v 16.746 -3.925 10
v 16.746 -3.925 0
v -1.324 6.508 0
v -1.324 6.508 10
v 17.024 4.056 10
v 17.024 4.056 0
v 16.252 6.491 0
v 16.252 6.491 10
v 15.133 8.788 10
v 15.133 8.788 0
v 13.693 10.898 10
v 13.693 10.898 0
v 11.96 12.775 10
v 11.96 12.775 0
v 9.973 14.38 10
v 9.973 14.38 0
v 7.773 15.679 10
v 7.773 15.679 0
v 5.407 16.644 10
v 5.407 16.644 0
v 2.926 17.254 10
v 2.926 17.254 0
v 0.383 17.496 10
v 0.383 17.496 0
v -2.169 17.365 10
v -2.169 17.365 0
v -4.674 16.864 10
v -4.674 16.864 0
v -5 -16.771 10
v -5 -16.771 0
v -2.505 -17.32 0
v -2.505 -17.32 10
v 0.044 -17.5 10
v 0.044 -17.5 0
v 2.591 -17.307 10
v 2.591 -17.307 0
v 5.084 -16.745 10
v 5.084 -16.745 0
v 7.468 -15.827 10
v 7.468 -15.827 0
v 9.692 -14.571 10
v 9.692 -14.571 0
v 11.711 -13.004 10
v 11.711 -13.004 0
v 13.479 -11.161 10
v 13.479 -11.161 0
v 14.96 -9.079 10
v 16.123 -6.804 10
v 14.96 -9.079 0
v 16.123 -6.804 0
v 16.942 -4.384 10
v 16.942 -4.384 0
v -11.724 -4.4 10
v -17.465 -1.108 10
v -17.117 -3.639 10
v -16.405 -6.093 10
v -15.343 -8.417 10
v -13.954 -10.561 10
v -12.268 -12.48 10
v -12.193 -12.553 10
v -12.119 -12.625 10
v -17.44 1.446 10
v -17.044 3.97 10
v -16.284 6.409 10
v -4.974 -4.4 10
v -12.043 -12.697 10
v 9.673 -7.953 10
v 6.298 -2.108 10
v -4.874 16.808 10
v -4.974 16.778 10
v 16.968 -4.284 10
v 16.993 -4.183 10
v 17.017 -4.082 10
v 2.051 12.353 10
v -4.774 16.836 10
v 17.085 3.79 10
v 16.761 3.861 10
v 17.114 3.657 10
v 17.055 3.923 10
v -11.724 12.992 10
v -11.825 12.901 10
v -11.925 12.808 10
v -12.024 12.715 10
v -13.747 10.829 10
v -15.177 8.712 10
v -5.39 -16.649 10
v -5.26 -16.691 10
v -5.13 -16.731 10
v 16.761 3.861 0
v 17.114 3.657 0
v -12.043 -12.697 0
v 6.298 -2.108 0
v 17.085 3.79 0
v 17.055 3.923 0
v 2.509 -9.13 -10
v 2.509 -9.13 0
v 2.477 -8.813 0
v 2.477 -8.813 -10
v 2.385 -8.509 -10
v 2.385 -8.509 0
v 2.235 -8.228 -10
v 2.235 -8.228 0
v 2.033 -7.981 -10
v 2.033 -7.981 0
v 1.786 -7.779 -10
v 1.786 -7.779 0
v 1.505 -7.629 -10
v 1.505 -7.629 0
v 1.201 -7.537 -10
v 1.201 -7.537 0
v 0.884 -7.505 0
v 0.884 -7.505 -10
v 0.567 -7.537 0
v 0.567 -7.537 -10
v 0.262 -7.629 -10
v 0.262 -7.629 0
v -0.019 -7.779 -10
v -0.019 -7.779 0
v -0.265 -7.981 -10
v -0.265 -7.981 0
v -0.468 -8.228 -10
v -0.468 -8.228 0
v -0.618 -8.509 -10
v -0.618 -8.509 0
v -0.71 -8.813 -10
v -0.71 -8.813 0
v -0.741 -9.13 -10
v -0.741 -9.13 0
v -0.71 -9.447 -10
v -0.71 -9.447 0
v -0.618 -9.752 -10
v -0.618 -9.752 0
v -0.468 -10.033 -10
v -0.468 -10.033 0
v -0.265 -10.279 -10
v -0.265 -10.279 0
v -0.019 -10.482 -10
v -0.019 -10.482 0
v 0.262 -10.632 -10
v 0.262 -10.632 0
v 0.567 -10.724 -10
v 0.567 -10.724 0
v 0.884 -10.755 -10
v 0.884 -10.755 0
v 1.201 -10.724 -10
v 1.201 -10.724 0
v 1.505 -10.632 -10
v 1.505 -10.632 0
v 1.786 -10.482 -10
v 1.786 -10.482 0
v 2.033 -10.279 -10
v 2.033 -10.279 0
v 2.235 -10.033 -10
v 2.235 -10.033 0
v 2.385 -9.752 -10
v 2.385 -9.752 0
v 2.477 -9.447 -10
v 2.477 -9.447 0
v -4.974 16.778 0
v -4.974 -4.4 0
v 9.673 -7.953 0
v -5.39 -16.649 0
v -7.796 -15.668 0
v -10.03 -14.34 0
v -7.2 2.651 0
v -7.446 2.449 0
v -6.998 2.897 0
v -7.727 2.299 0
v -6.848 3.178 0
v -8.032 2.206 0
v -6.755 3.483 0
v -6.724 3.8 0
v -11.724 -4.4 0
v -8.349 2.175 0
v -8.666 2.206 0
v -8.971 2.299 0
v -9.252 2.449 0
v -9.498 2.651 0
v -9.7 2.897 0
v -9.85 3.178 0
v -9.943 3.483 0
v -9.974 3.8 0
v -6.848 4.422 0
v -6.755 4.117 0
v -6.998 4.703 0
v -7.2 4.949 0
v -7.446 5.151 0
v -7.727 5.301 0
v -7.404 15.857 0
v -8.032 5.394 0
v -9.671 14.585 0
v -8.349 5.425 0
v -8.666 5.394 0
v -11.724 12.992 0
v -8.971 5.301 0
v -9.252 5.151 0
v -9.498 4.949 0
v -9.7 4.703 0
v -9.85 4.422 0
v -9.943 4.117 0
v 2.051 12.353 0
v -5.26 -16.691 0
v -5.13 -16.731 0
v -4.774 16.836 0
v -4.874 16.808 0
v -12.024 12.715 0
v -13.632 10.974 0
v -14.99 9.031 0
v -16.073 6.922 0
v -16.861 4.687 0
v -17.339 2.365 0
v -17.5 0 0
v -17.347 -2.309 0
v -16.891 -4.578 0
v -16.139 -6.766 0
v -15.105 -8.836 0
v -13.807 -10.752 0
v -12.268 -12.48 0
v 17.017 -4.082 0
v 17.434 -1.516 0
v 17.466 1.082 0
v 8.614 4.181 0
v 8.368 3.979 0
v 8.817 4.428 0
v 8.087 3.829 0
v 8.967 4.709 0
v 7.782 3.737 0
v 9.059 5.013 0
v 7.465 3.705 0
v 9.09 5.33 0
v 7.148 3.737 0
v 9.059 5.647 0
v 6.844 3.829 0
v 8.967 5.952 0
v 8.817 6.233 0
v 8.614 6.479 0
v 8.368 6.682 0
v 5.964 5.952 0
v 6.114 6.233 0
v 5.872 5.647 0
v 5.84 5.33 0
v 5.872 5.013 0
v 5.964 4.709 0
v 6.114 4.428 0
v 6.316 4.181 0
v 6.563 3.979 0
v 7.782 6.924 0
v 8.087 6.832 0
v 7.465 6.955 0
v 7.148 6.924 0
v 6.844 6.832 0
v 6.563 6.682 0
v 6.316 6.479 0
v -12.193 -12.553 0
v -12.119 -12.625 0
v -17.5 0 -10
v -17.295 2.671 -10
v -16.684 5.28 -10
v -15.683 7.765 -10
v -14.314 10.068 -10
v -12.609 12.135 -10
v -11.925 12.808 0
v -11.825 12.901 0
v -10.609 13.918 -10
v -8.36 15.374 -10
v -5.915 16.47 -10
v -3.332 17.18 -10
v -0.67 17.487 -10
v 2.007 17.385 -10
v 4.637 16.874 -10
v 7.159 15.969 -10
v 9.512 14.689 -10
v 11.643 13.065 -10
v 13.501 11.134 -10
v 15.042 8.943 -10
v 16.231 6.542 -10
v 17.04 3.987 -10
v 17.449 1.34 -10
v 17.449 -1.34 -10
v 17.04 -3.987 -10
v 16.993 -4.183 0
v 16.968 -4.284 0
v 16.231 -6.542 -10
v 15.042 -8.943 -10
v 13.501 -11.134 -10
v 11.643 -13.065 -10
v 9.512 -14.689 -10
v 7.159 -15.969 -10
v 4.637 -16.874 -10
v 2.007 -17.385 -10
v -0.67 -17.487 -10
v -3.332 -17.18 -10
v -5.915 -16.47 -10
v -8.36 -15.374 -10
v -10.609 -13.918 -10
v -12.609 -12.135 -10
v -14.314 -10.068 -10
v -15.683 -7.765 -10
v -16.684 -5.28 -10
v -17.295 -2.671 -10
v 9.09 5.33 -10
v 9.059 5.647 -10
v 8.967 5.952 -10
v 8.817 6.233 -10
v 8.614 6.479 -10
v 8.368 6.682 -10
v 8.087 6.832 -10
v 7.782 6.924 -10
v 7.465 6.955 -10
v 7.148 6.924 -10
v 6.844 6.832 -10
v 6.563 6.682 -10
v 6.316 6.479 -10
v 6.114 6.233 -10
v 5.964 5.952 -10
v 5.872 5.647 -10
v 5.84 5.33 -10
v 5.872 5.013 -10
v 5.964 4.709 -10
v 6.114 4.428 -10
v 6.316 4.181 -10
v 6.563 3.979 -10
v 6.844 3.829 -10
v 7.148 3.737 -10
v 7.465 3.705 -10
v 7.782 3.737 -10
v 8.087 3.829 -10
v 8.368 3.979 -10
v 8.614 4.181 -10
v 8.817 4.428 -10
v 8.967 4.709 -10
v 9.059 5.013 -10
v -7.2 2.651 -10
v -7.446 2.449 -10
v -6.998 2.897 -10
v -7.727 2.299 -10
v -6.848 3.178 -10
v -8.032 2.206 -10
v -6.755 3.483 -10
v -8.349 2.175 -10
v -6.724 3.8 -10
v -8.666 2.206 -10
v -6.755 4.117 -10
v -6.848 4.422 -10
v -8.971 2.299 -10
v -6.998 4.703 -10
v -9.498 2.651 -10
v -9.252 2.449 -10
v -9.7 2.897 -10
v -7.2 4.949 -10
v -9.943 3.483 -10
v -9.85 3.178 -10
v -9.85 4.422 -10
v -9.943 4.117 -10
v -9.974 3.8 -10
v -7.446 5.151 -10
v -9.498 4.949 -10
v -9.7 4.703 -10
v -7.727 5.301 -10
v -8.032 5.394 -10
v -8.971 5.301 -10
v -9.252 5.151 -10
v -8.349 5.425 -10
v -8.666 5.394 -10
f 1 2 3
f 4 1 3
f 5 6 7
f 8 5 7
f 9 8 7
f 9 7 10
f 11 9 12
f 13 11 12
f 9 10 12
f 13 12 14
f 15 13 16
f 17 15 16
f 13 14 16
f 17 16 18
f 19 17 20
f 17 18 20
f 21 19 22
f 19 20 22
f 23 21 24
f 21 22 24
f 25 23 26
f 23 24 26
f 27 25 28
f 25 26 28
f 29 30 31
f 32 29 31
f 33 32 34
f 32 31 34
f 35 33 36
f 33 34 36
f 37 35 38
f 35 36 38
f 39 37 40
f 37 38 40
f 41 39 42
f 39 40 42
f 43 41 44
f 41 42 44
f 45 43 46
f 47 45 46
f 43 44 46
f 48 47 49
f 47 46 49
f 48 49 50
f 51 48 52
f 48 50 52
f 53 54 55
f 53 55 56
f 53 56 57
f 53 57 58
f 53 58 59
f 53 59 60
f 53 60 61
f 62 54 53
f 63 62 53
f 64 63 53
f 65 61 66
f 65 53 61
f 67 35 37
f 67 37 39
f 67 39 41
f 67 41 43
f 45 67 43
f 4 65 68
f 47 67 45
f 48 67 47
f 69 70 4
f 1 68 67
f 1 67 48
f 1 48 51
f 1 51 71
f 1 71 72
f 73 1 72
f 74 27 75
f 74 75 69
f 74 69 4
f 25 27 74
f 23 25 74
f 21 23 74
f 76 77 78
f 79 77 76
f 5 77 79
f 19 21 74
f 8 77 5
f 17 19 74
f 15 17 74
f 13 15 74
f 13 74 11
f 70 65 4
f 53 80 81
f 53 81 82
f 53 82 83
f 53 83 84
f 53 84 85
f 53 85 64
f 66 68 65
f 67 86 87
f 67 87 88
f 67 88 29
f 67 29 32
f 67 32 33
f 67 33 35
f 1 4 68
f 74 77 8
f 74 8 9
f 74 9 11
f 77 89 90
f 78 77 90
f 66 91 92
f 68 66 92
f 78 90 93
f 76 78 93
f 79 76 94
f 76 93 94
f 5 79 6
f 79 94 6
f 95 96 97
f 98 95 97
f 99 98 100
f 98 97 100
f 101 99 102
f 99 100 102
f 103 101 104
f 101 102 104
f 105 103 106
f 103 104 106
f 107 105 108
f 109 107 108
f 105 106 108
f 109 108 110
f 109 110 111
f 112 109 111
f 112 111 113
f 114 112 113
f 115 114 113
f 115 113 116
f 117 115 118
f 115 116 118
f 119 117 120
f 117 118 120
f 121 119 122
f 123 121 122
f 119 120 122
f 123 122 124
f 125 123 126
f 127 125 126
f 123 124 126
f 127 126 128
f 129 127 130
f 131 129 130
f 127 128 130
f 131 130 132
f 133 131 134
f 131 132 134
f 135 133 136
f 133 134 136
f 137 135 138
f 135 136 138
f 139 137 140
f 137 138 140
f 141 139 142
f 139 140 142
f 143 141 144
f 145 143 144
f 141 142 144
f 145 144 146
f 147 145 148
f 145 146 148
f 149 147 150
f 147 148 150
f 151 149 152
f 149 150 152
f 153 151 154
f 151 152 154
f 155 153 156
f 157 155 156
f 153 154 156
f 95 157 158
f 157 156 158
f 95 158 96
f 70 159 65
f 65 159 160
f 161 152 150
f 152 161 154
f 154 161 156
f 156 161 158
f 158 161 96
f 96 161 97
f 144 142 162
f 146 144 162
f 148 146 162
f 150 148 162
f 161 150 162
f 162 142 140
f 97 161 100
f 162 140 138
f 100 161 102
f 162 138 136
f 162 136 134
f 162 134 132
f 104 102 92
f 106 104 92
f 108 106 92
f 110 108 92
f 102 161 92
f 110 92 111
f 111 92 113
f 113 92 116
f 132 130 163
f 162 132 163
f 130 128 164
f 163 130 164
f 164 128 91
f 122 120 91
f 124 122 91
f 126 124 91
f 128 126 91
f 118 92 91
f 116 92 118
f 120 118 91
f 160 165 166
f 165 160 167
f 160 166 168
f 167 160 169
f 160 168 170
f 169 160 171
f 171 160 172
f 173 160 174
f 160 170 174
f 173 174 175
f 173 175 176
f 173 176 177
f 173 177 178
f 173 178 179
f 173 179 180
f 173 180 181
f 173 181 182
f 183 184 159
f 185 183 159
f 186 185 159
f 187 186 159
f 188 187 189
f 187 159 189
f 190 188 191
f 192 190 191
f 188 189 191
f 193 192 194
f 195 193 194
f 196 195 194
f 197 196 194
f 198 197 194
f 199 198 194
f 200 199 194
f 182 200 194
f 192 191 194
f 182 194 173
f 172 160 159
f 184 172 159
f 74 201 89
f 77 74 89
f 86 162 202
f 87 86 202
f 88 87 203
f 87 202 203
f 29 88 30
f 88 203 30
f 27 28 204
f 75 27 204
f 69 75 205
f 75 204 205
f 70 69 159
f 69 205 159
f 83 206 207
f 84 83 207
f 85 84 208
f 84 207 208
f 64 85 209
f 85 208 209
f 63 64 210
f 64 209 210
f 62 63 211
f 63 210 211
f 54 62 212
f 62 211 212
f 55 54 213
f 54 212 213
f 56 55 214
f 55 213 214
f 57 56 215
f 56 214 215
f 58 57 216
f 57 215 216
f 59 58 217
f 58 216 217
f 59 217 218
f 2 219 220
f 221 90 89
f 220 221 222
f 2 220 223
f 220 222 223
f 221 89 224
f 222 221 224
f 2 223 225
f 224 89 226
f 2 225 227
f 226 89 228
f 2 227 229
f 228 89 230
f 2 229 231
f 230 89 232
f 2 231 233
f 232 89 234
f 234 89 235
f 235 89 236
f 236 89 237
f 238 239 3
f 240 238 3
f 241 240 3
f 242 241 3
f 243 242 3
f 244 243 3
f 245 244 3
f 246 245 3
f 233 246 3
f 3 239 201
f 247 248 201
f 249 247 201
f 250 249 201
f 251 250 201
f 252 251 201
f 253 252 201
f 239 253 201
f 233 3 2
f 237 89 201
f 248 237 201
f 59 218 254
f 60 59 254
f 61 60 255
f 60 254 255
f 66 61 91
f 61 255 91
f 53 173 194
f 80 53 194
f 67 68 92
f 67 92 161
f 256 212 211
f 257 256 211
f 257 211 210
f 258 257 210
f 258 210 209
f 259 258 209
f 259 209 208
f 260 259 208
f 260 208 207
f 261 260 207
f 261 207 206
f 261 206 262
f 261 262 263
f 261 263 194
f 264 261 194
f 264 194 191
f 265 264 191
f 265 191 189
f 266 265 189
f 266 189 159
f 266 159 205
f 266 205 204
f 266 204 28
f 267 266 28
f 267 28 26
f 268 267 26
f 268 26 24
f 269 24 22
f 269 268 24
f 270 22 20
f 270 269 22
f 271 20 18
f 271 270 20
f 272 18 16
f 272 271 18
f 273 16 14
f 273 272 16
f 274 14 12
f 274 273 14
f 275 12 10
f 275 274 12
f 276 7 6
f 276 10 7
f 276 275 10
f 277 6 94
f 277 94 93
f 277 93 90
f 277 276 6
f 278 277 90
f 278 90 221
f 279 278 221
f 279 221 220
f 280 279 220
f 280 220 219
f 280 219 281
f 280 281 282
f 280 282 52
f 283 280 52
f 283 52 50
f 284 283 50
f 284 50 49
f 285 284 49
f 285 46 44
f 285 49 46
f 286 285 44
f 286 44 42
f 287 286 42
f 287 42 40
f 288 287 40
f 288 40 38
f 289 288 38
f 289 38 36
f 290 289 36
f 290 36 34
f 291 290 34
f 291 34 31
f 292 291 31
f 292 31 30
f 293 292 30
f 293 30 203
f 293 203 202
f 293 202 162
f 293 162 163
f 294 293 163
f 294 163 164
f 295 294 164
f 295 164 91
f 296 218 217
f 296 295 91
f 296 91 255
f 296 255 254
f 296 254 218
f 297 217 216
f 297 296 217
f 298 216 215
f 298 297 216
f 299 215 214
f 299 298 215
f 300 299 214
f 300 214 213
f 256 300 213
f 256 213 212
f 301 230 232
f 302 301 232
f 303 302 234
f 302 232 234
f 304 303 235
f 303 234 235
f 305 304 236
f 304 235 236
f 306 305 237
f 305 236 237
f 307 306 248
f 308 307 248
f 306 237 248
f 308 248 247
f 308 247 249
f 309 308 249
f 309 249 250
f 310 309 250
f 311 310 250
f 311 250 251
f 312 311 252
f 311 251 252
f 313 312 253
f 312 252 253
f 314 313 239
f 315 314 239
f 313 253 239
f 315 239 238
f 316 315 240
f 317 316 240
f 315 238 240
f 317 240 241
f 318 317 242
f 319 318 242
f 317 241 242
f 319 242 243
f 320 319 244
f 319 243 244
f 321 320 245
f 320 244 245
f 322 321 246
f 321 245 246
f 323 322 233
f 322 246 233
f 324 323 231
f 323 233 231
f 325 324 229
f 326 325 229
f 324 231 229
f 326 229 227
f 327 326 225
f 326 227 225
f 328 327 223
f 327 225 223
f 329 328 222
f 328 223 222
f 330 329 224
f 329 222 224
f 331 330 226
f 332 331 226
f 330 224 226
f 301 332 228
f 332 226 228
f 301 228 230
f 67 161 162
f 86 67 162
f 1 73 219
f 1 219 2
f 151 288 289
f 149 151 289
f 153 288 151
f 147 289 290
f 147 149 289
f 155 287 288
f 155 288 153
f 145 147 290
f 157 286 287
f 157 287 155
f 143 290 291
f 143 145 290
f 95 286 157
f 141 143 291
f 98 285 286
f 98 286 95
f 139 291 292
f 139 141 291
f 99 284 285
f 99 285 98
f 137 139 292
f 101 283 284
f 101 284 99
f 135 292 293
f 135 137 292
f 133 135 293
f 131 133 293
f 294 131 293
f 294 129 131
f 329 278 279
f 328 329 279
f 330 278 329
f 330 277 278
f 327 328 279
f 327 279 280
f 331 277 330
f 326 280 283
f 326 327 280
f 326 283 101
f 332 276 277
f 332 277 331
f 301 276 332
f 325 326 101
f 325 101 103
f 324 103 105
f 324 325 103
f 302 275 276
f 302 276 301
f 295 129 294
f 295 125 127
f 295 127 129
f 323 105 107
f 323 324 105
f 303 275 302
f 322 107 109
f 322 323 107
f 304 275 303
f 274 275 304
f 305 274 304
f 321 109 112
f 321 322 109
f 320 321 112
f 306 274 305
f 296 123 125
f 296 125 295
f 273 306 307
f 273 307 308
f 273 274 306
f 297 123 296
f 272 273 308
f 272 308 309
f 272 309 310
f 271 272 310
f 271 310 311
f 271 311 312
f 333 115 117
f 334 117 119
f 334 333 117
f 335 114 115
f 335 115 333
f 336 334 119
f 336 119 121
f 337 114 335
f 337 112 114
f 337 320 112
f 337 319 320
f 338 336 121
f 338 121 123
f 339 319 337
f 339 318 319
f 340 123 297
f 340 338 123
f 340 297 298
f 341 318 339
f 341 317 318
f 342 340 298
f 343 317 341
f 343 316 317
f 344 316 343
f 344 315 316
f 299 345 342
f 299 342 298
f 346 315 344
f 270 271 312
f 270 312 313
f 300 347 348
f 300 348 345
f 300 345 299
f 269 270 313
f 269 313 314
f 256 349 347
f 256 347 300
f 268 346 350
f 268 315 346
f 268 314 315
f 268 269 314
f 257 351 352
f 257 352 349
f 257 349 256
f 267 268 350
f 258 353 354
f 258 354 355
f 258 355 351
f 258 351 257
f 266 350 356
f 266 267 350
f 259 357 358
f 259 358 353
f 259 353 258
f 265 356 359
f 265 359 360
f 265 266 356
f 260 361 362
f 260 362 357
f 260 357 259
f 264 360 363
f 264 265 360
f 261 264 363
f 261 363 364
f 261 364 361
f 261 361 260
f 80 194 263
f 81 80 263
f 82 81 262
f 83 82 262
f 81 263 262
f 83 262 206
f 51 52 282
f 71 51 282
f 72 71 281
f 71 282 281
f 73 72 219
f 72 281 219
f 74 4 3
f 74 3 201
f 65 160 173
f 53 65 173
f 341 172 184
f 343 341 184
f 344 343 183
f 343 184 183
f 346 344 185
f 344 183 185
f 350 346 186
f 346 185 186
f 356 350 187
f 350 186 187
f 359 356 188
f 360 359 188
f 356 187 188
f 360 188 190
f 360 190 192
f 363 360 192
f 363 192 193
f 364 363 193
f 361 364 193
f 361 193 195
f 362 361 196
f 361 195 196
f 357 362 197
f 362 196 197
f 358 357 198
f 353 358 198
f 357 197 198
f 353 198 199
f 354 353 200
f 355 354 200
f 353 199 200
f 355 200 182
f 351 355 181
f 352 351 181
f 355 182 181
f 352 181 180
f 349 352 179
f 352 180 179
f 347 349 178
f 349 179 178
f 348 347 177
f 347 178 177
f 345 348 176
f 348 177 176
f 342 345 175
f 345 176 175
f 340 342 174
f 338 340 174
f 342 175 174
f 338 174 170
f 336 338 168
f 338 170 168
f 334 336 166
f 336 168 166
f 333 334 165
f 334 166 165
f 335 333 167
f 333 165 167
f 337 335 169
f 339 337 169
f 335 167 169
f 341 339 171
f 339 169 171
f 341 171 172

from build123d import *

# Parameters (mm, degrees)
SALIENTE_EXTRUIR1_DEPTH = 10
SALIENTE_EXTRUIR2_START = 10
CROQUIS3_R              = 17.5
SALIENTE_EXTRUIR2_DEPTH = 10
CROQUIS1_3_R            = 1.625
CORTAR_EXTRUIR4_DEPTH   = 10
SALIENTE_EXTRUIR3_START = -10
SALIENTE_EXTRUIR3_DEPTH = 10


with BuildPart() as part:
    # Croquis1 → Saliente-Extruir1 (new body)
    with BuildSketch(Plane.XY):
        with BuildLine():
            Line((6.407309398, -1.697785417), (10.082309398, -8.063072135))
            Line((10.082309398, -8.063072135), (-4.999614275, -16.770624827))
            ThreePointArc((-4.999614275, -16.770624827), (8.602870321, -15.239442977), (16.941884153, -4.384354154))
            Line((16.941884153, -4.384354154), (-1.733329398, 6.397785417))
            Line((-1.733329398, 6.397785417), (1.941670602, 12.763072135))
            Line((1.941670602, 12.763072135), (17.023594275, 4.055519442))
            ThreePointArc((17.023594275, 4.055519442), (8.896309597, 15.070025732), (-4.67398, 16.864279141))
            Line((-4.67398, 16.864279141), (-4.67398, -4.7))
            Line((-4.67398, -4.7), (-12.02398, -4.7))
            Line((-12.02398, -4.7), (-12.02398, 12.715105385))
            ThreePointArc((-12.02398, 12.715105385), (-17.499179918, 0.169417245), (-12.267904153, -12.479924987))
            Line((-12.267904153, -12.479924987), (6.407309398, -1.697785417))
        make_face()
    extrude(amount=SALIENTE_EXTRUIR1_DEPTH)

    # Croquis3 → Saliente-Extruir2 (add)
    with BuildSketch(Plane(origin=(0, 0, 0), x_dir=(-1, 0, 0), z_dir=(0, 0, -1)).offset(SALIENTE_EXTRUIR2_START)):
        Circle(CROQUIS3_R)
    extrude(amount=-SALIENTE_EXTRUIR2_DEPTH)

    # Croquis1<3> → Cortar-Extruir4 (cut)
    with BuildSketch(Plane.XY):
        with Locations((-8.34898, 3.8)):
            Circle(CROQUIS1_3_R)
        with Locations((7.465386534, 5.330428776)):
            Circle(CROQUIS1_3_R)
        with Locations((0.883593466, -9.130428776)):
            Circle(CROQUIS1_3_R)
    extrude(amount=-CORTAR_EXTRUIR4_DEPTH, mode=Mode.SUBTRACT)

    # Croquis4 → Saliente-Extruir3 (add)
    with BuildSketch(Plane.XY.offset(10).offset(SALIENTE_EXTRUIR3_START)):
        with BuildLine():
            ThreePointArc((-4.67398, 16.864279141), (-4.824171793, 16.821931117), (-4.97398, 16.778245527))
            Line((-4.97398, 16.778245527), (-4.97398, -4.4))
            Line((-4.97398, -4.4), (-11.72398, -4.4))
            Line((-11.72398, -4.4), (-11.72398, 12.992239721))
            ThreePointArc((-11.72398, 12.992239721), (-11.874788499, 12.854547759), (-12.02398, 12.715105385))
            Line((-12.02398, 12.715105385), (-12.02398, -4.7))
            Line((-12.02398, -4.7), (-4.67398, -4.7))
            Line((-4.67398, -4.7), (-4.67398, 16.864279141))
        make_face()
        with BuildLine():
            ThreePointArc((17.11359965, 3.657144653), (17.069759163, 3.856594625), (17.023594275, 4.055519442))
            Line((17.023594275, 4.055519442), (1.941670602, 12.763072135))
            Line((1.941670602, 12.763072135), (-1.733329398, 6.397785417))
            Line((-1.733329398, 6.397785417), (16.941884153, -4.384354154))
            ThreePointArc((16.941884153, -4.384354154), (16.980305585, -4.233110234), (17.017376857, -4.081529726))
            Line((17.017376857, -4.081529726), (-1.323521777, 6.507593038))
            Line((-1.323521777, 6.507593038), (2.051478223, 12.353264513))
            Line((2.051478223, 12.353264513), (17.11359965, 3.657144653))
        make_face()
        with BuildLine():
            Line((6.407309398, -1.697785417), (-12.267904153, -12.479924987))
            ThreePointArc((-12.267904153, -12.479924987), (-12.156133792, -12.588820883), (-12.043396857, -12.696715801))
            Line((-12.043396857, -12.696715801), (6.297501777, -2.107593038))
            Line((6.297501777, -2.107593038), (9.672501777, -7.953264513))
            Line((9.672501777, -7.953264513), (-5.38961965, -16.649384374))
            ThreePointArc((-5.38961965, -16.649384374), (-5.194970664, -16.711142385), (-4.999614275, -16.770624827))
            Line((-4.999614275, -16.770624827), (10.082309398, -8.063072135))
            Line((10.082309398, -8.063072135), (6.407309398, -1.697785417))
        make_face()
    extrude(amount=SALIENTE_EXTRUIR3_DEPTH)


solid = part.part
